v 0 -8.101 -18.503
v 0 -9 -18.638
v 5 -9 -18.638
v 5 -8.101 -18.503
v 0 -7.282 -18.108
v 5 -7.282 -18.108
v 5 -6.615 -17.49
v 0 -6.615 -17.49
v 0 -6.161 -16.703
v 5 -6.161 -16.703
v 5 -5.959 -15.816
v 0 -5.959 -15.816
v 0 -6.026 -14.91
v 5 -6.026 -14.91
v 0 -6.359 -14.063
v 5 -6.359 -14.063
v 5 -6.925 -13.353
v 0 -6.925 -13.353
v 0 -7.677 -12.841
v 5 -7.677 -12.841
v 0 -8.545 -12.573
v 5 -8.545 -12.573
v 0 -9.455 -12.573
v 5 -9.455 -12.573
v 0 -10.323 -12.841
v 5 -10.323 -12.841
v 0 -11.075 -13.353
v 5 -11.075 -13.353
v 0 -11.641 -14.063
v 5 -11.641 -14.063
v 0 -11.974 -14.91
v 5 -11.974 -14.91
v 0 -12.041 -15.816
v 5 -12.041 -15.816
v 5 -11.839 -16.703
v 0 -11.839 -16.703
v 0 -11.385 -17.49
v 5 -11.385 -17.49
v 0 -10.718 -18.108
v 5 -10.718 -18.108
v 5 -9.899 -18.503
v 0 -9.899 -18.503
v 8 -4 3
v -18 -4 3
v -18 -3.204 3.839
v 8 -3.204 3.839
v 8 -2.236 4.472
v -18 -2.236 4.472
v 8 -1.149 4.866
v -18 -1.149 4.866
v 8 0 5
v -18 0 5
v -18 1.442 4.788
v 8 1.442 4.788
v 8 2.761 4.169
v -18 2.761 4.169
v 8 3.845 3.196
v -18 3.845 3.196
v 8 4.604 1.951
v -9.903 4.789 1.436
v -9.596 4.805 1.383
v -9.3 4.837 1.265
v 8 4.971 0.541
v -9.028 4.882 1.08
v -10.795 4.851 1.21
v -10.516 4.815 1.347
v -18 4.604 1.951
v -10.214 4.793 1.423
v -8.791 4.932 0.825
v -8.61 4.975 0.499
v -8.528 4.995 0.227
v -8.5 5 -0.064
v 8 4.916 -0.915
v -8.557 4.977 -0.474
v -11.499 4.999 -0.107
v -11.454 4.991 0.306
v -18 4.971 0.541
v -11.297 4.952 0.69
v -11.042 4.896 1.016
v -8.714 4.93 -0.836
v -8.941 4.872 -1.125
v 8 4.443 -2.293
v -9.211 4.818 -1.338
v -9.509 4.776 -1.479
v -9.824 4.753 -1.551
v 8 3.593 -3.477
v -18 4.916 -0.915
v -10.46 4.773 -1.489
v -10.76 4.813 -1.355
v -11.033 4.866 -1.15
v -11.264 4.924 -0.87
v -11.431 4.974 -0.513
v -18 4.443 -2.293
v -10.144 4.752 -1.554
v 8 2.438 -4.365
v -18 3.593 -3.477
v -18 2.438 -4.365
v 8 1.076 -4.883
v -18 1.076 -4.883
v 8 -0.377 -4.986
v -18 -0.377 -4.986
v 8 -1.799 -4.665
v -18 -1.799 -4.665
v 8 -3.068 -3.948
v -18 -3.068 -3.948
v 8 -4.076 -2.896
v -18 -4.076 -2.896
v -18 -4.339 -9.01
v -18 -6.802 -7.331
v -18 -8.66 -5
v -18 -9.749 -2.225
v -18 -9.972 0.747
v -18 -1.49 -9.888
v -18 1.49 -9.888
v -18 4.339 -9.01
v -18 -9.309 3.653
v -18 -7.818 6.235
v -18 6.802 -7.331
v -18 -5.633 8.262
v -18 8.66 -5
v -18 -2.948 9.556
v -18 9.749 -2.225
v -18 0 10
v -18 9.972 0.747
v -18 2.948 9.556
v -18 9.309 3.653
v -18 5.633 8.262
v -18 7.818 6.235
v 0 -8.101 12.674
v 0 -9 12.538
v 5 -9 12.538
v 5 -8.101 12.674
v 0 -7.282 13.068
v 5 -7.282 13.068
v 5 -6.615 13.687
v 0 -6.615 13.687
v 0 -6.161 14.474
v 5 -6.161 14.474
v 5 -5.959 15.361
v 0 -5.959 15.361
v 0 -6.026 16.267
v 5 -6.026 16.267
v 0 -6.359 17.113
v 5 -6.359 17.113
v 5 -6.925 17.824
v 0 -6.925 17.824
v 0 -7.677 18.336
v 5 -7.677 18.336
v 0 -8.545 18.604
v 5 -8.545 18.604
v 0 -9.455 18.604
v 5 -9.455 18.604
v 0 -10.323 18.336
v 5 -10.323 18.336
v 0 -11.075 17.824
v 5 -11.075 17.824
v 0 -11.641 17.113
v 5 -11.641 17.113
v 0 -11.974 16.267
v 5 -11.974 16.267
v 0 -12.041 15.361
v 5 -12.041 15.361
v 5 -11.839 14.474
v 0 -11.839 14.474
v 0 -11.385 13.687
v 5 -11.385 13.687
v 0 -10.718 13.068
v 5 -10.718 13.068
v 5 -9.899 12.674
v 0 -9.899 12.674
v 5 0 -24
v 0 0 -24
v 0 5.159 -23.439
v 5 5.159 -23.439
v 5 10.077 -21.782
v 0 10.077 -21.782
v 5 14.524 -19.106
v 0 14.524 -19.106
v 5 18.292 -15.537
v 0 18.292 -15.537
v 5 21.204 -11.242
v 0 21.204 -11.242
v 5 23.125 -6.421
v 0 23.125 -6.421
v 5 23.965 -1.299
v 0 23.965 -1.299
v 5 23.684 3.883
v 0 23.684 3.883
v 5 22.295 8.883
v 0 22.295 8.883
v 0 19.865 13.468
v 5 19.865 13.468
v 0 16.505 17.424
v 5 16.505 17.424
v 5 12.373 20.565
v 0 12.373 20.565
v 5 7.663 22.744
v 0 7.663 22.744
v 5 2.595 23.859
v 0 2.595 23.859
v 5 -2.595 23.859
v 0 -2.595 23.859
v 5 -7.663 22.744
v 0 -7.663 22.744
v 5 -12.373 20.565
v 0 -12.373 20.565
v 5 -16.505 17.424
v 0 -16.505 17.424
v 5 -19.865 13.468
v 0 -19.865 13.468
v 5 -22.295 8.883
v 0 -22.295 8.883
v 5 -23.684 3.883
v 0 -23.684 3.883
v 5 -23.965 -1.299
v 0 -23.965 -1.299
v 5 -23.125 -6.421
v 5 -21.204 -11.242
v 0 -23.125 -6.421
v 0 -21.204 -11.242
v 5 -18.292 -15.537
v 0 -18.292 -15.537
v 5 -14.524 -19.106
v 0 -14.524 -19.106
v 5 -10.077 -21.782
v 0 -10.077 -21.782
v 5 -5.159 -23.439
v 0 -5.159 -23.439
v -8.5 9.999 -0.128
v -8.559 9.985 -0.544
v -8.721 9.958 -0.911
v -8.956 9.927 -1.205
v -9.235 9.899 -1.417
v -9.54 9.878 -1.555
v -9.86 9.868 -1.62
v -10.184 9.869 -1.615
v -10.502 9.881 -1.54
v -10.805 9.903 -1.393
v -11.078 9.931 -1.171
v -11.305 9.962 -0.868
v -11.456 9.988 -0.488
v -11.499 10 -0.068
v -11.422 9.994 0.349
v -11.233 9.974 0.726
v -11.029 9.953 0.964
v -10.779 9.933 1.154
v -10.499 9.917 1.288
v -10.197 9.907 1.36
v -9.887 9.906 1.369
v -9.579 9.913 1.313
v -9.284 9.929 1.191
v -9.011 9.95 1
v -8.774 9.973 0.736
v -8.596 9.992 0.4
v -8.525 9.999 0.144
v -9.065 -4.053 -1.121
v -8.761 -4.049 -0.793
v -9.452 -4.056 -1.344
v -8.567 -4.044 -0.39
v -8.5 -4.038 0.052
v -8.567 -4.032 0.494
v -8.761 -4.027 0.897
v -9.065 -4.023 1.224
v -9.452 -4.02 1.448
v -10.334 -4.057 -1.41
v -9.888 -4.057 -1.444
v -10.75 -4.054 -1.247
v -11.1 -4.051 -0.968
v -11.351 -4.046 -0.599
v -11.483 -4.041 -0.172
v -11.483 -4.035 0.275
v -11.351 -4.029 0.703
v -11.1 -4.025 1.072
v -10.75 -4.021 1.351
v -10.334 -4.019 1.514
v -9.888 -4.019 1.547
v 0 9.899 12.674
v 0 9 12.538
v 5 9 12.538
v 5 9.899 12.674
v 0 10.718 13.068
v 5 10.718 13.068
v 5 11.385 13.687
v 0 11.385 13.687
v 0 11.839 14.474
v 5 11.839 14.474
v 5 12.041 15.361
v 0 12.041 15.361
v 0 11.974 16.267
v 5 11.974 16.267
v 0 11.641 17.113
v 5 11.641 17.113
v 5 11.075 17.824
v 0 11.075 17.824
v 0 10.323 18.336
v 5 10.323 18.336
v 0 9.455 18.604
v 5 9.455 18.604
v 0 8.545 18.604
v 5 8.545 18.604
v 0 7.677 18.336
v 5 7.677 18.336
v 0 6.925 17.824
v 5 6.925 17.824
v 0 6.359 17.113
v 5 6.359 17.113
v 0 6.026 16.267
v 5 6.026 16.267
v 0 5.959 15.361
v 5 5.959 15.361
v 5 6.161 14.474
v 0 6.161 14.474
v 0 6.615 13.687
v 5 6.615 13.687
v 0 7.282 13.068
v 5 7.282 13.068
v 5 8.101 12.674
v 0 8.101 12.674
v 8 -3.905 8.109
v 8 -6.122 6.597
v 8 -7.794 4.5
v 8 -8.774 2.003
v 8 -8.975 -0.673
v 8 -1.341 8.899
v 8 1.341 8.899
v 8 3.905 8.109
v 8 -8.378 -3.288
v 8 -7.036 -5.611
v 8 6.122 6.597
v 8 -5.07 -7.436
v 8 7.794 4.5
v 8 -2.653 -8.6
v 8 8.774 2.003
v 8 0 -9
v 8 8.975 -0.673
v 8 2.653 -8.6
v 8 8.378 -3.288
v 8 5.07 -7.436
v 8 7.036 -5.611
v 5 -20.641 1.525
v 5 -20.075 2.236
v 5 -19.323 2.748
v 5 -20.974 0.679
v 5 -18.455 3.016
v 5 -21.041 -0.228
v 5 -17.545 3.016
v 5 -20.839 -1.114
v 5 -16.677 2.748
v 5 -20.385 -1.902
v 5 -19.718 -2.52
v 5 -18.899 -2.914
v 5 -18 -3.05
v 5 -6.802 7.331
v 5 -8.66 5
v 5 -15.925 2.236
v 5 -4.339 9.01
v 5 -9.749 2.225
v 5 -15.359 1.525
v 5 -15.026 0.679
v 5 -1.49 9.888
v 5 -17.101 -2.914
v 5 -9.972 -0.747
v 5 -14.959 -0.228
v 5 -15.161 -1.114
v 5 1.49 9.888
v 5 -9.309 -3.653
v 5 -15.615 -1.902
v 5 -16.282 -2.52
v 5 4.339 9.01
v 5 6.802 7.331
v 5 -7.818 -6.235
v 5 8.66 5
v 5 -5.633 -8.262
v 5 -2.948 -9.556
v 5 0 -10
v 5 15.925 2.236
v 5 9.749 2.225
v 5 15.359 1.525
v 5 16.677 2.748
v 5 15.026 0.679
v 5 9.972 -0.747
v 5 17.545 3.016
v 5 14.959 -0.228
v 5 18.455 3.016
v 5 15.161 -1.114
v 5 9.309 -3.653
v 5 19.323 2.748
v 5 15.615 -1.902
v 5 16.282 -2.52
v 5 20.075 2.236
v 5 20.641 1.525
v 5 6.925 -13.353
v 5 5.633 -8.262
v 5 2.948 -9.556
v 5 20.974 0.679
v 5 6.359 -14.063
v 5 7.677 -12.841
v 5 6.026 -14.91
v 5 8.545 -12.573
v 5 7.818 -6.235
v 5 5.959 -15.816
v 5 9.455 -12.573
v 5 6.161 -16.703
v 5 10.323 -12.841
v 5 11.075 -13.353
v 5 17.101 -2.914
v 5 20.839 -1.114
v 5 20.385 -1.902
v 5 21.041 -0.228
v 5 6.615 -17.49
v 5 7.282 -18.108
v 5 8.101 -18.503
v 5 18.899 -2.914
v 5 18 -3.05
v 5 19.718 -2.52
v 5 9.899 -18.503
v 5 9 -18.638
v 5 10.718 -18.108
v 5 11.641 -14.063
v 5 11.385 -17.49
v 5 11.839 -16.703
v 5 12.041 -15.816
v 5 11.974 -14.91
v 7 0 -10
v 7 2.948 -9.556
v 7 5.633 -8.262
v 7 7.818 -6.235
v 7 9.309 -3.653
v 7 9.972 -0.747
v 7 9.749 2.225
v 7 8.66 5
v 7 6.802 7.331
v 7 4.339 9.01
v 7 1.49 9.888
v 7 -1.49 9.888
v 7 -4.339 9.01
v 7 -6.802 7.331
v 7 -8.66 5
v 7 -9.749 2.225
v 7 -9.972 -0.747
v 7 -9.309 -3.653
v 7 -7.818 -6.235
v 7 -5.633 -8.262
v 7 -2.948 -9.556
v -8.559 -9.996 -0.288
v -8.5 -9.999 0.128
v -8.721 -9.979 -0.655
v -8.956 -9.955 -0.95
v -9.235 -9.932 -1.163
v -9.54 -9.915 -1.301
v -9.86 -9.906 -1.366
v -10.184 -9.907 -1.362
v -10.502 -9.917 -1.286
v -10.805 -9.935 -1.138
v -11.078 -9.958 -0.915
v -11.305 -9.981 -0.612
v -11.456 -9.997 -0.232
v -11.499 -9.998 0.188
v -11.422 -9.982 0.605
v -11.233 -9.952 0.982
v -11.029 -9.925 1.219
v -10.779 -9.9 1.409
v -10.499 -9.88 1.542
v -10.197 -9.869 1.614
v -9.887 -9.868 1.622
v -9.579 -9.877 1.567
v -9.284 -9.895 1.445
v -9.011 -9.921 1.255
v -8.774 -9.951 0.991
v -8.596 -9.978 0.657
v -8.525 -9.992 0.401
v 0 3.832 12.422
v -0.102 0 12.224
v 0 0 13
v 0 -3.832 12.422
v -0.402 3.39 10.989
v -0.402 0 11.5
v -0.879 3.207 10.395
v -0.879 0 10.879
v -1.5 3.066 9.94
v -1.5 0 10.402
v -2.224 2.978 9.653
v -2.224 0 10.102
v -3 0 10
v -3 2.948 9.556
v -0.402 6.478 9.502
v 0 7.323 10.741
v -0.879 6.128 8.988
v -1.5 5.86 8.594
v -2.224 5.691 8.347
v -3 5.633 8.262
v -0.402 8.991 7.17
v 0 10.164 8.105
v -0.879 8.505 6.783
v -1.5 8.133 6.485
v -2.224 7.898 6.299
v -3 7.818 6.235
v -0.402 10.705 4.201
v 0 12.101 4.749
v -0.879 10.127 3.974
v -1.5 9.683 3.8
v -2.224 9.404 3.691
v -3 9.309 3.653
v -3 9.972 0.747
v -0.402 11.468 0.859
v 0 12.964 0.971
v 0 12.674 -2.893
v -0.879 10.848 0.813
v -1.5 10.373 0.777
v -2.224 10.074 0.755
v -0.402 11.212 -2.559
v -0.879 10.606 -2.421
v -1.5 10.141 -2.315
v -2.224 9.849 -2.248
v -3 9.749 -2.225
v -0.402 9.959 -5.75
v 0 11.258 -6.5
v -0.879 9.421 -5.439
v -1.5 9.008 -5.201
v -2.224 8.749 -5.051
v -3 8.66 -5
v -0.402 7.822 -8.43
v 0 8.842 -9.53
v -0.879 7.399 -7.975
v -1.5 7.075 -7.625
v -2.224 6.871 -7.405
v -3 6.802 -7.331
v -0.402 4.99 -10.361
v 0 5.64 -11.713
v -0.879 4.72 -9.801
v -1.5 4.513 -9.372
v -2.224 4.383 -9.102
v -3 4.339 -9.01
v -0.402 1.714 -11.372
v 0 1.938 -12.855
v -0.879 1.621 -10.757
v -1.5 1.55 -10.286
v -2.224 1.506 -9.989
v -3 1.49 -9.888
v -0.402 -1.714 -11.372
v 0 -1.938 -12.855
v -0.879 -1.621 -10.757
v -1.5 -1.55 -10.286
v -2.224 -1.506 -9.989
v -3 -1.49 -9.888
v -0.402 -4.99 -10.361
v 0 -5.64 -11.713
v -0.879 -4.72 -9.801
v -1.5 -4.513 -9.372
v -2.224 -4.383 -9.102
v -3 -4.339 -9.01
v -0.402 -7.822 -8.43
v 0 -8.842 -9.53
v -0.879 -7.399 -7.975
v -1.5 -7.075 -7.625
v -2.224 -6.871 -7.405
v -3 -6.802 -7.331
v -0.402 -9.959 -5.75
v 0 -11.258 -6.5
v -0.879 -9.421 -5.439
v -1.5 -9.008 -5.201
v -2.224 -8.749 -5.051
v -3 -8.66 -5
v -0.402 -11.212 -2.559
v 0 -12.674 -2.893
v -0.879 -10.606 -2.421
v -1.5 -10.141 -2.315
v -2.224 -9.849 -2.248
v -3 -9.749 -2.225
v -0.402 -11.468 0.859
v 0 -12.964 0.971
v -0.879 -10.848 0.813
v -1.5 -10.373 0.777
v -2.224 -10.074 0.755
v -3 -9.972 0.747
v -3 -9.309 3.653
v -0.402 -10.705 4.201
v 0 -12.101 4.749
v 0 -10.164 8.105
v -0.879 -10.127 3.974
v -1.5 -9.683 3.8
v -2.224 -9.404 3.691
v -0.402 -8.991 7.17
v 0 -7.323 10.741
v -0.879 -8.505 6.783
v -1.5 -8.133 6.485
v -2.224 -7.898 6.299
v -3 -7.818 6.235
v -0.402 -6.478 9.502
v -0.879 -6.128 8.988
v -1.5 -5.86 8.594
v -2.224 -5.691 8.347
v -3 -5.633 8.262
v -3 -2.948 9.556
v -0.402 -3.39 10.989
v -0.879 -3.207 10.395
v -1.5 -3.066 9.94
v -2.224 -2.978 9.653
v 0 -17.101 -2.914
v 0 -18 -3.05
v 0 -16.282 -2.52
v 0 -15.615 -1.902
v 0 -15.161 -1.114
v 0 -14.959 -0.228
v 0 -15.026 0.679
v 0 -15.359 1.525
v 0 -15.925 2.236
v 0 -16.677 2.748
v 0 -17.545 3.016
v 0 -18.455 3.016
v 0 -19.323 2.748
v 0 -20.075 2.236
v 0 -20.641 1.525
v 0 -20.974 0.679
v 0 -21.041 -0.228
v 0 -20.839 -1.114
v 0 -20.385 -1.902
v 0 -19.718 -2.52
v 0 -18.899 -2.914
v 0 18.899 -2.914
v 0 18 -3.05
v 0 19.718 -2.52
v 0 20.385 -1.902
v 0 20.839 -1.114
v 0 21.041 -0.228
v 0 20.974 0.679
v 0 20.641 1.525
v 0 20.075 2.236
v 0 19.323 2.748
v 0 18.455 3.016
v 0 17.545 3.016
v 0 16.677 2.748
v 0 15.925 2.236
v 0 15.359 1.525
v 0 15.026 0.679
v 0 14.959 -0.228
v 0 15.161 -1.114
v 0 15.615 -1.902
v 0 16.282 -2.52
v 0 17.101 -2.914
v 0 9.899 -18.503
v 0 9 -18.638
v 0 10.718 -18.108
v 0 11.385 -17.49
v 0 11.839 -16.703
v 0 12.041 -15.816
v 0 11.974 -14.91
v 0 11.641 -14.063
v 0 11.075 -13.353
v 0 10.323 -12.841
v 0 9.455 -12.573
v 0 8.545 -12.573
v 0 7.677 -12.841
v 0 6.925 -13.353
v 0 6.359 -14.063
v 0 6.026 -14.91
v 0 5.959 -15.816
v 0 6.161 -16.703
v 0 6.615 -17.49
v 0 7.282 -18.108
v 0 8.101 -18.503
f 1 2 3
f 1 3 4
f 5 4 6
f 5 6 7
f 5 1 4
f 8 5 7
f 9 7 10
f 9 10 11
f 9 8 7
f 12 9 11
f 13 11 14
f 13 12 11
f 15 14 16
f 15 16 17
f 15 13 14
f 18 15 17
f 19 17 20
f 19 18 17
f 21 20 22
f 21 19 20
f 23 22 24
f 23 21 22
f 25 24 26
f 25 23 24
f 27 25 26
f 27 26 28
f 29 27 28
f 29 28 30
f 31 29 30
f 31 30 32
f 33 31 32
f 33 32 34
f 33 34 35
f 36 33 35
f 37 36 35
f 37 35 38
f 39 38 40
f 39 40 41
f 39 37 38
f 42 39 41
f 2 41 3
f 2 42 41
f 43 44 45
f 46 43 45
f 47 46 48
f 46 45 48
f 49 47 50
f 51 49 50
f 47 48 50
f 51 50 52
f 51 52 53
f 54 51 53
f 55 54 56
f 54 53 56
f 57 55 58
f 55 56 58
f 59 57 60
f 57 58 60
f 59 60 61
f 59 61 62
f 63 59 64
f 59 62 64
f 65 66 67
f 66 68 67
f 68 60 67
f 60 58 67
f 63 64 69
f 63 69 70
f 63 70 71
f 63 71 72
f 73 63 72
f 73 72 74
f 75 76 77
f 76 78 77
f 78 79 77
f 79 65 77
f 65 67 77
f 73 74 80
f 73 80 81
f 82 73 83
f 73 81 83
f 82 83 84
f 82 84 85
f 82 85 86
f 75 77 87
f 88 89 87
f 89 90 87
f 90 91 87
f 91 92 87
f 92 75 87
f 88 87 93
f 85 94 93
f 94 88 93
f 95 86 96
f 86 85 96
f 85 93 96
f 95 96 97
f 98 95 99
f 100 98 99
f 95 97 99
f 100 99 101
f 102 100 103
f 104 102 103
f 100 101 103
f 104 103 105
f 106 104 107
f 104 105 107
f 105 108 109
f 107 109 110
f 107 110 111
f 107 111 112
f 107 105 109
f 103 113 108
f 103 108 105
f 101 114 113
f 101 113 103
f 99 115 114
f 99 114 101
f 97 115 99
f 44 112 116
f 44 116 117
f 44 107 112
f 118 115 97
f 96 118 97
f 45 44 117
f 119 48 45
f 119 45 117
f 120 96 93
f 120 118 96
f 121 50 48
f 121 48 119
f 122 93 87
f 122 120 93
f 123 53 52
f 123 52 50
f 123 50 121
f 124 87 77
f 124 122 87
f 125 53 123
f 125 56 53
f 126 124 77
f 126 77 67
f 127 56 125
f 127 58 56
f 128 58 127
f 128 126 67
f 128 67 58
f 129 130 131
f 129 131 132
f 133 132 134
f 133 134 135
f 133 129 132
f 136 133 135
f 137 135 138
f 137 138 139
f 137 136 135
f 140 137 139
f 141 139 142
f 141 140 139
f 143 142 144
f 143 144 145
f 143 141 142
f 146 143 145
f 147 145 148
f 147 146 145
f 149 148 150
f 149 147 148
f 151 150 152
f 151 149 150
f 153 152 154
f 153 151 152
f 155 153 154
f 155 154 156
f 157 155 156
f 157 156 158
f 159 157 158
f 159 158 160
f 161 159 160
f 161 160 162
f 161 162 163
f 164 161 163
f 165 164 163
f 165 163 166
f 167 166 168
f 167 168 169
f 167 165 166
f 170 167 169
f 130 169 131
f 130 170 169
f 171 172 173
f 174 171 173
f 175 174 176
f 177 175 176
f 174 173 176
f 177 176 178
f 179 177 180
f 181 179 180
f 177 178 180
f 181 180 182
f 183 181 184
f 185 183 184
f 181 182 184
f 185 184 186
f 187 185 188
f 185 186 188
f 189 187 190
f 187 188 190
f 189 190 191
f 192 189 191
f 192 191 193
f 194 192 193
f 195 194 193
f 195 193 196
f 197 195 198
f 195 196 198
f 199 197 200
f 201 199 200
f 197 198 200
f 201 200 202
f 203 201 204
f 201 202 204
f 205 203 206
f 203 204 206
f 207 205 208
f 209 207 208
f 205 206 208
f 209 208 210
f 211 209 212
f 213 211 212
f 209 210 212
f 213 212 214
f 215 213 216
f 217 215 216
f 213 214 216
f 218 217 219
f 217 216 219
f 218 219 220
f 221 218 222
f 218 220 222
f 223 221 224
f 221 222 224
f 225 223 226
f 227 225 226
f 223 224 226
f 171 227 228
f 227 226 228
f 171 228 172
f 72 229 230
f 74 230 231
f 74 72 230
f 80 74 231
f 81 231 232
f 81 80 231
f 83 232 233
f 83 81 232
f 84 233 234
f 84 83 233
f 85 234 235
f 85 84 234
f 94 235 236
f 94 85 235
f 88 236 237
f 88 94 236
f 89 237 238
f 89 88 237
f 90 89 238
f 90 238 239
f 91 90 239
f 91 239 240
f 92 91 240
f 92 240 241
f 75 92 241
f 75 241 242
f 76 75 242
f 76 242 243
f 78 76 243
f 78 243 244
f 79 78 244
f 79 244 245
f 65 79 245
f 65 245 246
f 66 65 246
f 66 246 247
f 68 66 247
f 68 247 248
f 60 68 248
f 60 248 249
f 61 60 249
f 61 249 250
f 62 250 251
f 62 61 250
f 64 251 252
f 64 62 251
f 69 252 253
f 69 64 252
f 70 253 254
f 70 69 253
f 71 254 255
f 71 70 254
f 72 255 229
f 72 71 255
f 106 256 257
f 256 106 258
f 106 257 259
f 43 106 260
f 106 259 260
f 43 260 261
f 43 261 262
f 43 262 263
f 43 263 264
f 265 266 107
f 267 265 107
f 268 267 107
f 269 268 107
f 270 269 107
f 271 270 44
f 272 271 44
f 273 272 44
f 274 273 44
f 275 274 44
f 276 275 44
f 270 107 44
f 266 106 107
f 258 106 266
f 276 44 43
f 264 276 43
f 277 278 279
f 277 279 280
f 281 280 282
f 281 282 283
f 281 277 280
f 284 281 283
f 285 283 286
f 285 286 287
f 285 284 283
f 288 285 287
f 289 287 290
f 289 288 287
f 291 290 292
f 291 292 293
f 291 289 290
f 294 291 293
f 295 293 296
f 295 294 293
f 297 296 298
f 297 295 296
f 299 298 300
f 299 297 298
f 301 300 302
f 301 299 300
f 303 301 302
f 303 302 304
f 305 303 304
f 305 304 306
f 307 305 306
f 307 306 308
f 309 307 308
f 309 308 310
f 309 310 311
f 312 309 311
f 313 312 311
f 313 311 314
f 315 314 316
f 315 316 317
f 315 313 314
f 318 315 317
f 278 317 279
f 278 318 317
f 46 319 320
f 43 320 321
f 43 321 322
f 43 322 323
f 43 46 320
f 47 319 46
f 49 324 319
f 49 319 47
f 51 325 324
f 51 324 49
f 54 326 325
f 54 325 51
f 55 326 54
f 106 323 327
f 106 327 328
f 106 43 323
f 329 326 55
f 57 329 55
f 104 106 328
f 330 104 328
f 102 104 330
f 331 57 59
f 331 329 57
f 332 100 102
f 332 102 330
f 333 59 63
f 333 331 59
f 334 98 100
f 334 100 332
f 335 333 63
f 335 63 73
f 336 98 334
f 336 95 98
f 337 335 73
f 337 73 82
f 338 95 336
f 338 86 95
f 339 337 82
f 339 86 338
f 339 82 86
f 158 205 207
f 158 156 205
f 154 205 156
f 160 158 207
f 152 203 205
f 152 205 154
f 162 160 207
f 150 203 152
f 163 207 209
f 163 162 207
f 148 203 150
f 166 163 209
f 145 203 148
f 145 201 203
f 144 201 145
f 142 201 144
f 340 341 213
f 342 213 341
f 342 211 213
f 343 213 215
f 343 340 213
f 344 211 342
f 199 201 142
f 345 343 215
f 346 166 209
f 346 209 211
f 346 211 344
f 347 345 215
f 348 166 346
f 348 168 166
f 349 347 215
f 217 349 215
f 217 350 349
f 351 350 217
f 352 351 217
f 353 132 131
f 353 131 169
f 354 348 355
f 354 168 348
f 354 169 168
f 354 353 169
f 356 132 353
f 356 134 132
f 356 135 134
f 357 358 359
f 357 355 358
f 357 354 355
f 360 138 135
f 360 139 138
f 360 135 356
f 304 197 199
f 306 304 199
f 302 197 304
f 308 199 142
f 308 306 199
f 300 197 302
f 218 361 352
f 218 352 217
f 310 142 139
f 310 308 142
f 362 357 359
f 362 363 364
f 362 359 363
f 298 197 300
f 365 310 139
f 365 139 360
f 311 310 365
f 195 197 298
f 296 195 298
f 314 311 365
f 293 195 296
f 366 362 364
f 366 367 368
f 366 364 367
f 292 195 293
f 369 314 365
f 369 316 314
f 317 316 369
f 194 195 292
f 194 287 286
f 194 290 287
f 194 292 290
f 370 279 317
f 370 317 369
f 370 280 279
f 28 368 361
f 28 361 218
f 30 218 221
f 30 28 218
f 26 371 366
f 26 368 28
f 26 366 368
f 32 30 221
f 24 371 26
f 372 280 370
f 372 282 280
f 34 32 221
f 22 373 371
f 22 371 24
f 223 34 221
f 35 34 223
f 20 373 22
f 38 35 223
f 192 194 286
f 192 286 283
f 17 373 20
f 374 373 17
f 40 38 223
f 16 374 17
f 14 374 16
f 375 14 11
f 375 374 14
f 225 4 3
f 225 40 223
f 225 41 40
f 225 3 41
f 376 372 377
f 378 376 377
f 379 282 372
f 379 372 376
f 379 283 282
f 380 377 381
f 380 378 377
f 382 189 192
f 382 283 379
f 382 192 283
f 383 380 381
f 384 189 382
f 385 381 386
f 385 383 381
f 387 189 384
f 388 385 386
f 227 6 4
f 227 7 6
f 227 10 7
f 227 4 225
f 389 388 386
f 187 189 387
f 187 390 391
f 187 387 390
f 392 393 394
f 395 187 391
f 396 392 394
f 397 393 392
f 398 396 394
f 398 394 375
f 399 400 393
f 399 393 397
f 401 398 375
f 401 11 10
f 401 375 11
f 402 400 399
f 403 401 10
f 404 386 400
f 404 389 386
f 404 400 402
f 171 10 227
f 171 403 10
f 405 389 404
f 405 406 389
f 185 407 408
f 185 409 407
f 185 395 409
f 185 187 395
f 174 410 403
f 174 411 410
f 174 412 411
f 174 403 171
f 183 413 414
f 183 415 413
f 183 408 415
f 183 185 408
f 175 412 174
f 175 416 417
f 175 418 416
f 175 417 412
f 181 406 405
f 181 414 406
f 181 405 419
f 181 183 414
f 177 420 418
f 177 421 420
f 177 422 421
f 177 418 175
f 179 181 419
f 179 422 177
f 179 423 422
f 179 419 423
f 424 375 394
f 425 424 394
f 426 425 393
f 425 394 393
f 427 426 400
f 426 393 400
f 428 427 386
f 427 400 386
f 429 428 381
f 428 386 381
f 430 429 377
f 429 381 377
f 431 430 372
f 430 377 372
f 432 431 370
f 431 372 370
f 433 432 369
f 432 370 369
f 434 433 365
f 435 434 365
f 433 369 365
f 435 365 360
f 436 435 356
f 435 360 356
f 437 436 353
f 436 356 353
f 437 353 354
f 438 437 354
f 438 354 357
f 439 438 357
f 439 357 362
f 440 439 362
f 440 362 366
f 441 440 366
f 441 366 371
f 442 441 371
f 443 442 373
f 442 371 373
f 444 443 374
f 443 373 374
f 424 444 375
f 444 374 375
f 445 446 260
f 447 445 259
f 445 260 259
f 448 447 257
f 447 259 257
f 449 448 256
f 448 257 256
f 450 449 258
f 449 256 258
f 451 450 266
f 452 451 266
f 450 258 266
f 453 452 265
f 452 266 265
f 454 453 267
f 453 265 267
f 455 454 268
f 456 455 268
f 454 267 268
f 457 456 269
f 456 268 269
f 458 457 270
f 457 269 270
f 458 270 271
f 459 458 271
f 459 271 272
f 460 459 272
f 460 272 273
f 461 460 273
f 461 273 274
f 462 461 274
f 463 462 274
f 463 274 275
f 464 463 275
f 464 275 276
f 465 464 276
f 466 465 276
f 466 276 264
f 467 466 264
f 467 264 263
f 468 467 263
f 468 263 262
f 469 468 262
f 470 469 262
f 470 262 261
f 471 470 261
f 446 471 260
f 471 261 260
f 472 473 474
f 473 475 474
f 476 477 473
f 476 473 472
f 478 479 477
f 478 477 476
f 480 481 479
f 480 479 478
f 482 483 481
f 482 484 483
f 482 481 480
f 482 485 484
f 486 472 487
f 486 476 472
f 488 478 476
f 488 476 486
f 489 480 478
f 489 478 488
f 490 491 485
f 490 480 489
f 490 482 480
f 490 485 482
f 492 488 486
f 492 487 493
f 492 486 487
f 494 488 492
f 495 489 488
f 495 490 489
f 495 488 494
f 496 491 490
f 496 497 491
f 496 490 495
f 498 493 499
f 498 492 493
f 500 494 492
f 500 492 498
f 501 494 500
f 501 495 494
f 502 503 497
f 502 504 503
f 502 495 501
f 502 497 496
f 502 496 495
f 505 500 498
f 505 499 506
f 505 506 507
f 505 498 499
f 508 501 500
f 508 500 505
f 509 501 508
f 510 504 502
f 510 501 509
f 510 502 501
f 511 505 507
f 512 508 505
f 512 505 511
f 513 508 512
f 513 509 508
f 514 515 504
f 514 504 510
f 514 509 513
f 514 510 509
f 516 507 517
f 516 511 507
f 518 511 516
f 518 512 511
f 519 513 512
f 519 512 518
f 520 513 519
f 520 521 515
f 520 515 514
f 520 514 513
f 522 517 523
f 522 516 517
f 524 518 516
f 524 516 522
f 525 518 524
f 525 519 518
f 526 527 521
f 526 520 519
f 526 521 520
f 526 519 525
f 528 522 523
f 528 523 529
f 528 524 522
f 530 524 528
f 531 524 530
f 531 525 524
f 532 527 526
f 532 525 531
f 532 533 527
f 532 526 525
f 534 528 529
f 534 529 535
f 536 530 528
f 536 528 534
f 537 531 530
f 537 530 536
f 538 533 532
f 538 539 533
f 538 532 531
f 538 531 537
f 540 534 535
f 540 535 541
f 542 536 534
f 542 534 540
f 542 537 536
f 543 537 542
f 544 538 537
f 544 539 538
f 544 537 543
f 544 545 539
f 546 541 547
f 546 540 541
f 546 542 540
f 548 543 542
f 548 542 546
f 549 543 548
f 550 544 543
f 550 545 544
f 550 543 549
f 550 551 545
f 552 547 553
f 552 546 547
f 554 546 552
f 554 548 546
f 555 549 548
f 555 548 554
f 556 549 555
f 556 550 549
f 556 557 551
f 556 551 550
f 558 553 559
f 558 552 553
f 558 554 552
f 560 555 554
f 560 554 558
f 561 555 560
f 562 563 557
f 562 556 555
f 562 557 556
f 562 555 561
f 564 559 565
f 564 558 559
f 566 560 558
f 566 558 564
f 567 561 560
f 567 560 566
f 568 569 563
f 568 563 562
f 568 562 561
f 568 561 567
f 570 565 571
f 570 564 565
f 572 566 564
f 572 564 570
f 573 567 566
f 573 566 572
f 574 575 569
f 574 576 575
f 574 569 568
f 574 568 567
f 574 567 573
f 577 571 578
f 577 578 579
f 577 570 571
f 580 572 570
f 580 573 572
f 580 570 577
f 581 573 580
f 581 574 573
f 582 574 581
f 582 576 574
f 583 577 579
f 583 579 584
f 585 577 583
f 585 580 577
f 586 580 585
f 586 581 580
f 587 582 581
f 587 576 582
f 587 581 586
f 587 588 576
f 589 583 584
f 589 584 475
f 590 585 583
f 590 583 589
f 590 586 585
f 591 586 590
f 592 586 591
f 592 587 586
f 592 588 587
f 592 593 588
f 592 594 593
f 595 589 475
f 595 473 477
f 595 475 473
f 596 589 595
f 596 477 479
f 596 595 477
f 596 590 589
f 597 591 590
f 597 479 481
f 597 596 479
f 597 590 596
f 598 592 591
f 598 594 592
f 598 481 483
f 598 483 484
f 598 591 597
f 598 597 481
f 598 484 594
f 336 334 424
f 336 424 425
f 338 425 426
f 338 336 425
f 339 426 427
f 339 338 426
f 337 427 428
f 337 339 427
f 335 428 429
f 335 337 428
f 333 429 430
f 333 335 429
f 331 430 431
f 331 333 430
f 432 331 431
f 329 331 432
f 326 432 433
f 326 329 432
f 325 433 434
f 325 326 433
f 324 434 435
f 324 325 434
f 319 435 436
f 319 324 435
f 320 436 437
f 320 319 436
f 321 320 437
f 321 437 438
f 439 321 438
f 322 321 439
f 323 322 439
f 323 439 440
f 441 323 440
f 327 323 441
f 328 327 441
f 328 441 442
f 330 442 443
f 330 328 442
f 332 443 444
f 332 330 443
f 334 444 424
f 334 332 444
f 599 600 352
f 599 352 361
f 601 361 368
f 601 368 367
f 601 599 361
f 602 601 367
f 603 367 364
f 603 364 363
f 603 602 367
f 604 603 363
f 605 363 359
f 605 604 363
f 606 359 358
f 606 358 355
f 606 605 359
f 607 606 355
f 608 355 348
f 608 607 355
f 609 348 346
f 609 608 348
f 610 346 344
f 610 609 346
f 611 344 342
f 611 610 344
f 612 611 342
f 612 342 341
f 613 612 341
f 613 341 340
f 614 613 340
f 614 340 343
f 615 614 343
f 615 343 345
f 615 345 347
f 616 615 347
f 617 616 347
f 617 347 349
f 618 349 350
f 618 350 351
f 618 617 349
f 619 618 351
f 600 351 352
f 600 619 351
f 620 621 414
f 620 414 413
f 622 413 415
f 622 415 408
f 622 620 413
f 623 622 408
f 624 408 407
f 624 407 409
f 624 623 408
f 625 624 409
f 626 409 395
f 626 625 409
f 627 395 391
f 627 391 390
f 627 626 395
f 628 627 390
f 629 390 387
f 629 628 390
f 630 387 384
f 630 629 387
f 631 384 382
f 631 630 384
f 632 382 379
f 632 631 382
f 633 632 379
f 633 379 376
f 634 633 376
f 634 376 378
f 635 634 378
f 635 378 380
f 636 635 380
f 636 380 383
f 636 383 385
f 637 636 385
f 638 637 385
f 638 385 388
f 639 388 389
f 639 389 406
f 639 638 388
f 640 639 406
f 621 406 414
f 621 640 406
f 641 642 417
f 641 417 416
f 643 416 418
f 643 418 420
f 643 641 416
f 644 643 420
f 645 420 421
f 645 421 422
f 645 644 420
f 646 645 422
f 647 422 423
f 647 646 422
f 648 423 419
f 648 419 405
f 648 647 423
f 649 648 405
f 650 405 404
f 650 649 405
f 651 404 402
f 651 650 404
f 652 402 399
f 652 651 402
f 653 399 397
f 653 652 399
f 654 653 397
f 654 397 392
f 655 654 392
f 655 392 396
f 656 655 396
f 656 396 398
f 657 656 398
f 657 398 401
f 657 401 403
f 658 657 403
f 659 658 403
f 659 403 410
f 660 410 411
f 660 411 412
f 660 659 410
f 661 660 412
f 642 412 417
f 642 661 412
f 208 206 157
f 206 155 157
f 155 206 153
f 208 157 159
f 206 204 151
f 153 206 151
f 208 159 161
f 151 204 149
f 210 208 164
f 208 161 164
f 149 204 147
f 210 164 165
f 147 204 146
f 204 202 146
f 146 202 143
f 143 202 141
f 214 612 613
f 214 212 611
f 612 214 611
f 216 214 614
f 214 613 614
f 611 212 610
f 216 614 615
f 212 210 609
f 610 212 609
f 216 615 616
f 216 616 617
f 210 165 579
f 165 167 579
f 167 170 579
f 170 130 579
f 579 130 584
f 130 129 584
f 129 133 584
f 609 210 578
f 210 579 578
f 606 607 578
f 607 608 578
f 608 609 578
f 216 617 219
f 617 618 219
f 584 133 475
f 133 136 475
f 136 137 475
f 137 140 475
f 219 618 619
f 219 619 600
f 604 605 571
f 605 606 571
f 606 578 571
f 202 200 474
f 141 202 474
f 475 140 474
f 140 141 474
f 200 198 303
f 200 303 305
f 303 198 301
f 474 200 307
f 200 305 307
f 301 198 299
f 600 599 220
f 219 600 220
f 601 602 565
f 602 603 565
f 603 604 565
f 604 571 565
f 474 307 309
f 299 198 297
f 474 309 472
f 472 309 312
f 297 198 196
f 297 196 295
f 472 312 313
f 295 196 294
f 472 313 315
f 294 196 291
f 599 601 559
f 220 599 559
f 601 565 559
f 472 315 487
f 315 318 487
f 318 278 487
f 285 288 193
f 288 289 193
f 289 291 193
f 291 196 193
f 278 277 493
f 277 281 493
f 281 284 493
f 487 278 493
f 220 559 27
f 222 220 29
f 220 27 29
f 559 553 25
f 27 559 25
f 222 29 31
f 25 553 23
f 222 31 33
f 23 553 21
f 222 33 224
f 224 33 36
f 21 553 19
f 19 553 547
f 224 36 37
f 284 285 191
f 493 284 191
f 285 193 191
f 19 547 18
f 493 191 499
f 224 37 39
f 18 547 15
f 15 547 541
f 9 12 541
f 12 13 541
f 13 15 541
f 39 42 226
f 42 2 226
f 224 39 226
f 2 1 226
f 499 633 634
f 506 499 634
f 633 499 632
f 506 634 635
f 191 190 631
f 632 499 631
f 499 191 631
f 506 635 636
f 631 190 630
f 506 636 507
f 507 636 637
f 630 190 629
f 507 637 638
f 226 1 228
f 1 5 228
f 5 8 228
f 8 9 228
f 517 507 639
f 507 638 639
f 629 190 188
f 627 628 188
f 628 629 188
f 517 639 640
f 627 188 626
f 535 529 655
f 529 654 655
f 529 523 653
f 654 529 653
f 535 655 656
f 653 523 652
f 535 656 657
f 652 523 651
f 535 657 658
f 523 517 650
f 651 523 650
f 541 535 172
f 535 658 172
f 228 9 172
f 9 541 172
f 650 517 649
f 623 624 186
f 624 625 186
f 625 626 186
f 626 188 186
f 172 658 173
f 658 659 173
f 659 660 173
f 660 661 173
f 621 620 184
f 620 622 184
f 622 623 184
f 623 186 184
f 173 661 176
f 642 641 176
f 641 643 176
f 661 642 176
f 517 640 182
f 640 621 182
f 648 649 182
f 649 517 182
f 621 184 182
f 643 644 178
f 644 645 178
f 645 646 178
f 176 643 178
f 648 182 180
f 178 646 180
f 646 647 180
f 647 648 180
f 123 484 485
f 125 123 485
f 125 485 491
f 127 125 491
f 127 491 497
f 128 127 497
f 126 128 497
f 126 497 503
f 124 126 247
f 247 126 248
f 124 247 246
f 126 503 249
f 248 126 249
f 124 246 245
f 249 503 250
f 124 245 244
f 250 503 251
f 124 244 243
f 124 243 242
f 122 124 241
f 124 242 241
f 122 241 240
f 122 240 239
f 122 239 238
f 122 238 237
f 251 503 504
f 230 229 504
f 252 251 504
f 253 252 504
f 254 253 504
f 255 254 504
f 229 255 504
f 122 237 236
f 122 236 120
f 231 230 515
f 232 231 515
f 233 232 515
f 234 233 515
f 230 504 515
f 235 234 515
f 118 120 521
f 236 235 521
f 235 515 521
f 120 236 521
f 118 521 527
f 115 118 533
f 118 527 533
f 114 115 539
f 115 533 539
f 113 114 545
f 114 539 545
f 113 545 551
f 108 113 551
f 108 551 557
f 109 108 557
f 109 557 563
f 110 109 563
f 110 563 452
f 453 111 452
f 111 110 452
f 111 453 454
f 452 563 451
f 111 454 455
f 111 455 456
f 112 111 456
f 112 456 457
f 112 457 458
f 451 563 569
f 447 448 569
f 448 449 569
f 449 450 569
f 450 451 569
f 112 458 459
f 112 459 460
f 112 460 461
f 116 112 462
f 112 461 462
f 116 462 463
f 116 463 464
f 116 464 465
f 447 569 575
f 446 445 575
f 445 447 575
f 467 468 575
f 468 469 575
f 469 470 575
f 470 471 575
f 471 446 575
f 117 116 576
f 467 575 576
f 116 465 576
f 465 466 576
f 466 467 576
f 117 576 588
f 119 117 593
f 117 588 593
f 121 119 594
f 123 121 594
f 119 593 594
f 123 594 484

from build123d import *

# Parameters (mm, degrees)
SKETCH_1_R               = 24
SKETCH_1_R_2             = 3.05
EXTRUDE_1_DEPTH          = 5
SKETCH_14_R              = 10
EXTRUDE_2_DEPTH          = 3
SKETCH_15_R              = 10
EXTRUDE_3_DEPTH          = 18
CUT_EXTRUDE_1_DEPTH      = 27
FILLET_5_R               = 3
CHAMFER_1_SIZE           = 1
SKETCH_18_R              = 1.5
CUT_EXTRUDE_4_DEPTH      = 29.344105586
CUT_EXTRUDE_4_DEPTH_BACK = 21.267784004


with BuildPart() as part:
    # Sketch 1 → 凸台-拉伸1 (new body)
    with BuildSketch(Plane(origin=(0, 0, 0), x_dir=(0, 0, -1), z_dir=(1, 0, 0))):
        Circle(SKETCH_1_R)
        with Locations((-15.588457268, 9)):
            Circle(SKETCH_1_R_2, mode=Mode.SUBTRACT)
        with Locations((0, 18)):
            Circle(SKETCH_1_R_2, mode=Mode.SUBTRACT)
        with Locations((15.588457268, 9)):
            Circle(SKETCH_1_R_2, mode=Mode.SUBTRACT)
        with Locations((15.588457268, -9)):
            Circle(SKETCH_1_R_2, mode=Mode.SUBTRACT)
        with Locations((0, -18)):
            Circle(SKETCH_1_R_2, mode=Mode.SUBTRACT)
        with Locations((-15.588457268, -9)):
            Circle(SKETCH_1_R_2, mode=Mode.SUBTRACT)
    extrude(amount=EXTRUDE_1_DEPTH)

    # 草图14 → 凸台-拉伸2 (add)
    with BuildSketch(Plane(origin=(5, 0, 0), x_dir=(0, 0, -1), z_dir=(1, 0, 0))):
        Circle(SKETCH_14_R)
    extrude(amount=EXTRUDE_2_DEPTH)

    # 草图15 → 凸台-拉伸3 (add)
    with BuildSketch(Plane.ZY):
        Circle(SKETCH_15_R)
    extrude(amount=EXTRUDE_3_DEPTH)

    # 草图16 → 切除-拉伸1 (cut, through all)
    with BuildSketch(Plane.ZY.offset(18)):
        with BuildLine():
            ThreePointArc((5, 0), (-2.29326147, 4.443079093), (-2.896380732, -4.075656838))
            Line((-2.896380732, -4.075656838), (3, -4))
            ThreePointArc((3, -4), (4.472135955, -2.236067977), (5, 0))
        make_face()
    extrude(amount=-CUT_EXTRUDE_1_DEPTH, mode=Mode.SUBTRACT)

    # 圆角5
    fillet_5_edges = [part.edges().sort_by_distance(p)[0] for p in [
        (0, 0, -10),
    ]]
    fillet(fillet_5_edges, radius=FILLET_5_R)

    # 倒角1
    chamfer_1_edges = [part.edges().sort_by_distance(p)[0] for p in [
        (8, 0, 10),
    ]]
    chamfer(chamfer_1_edges, length=CHAMFER_1_SIZE)

    # 草图18 → 切除-拉伸4 (cut, two sides)
    with BuildSketch(Plane(origin=(0, -4.037828419, 0.051809634), x_dir=(1, 0, 0), z_dir=(0, 0.999917692, -0.012830008))) as cut_extrude_4_sk:
        with Locations((-10, 0)):
            Circle(SKETCH_18_R)
    extrude(amount=CUT_EXTRUDE_4_DEPTH, mode=Mode.SUBTRACT)
    extrude(cut_extrude_4_sk.sketch, amount=-CUT_EXTRUDE_4_DEPTH_BACK, mode=Mode.SUBTRACT)


solid = part.part
